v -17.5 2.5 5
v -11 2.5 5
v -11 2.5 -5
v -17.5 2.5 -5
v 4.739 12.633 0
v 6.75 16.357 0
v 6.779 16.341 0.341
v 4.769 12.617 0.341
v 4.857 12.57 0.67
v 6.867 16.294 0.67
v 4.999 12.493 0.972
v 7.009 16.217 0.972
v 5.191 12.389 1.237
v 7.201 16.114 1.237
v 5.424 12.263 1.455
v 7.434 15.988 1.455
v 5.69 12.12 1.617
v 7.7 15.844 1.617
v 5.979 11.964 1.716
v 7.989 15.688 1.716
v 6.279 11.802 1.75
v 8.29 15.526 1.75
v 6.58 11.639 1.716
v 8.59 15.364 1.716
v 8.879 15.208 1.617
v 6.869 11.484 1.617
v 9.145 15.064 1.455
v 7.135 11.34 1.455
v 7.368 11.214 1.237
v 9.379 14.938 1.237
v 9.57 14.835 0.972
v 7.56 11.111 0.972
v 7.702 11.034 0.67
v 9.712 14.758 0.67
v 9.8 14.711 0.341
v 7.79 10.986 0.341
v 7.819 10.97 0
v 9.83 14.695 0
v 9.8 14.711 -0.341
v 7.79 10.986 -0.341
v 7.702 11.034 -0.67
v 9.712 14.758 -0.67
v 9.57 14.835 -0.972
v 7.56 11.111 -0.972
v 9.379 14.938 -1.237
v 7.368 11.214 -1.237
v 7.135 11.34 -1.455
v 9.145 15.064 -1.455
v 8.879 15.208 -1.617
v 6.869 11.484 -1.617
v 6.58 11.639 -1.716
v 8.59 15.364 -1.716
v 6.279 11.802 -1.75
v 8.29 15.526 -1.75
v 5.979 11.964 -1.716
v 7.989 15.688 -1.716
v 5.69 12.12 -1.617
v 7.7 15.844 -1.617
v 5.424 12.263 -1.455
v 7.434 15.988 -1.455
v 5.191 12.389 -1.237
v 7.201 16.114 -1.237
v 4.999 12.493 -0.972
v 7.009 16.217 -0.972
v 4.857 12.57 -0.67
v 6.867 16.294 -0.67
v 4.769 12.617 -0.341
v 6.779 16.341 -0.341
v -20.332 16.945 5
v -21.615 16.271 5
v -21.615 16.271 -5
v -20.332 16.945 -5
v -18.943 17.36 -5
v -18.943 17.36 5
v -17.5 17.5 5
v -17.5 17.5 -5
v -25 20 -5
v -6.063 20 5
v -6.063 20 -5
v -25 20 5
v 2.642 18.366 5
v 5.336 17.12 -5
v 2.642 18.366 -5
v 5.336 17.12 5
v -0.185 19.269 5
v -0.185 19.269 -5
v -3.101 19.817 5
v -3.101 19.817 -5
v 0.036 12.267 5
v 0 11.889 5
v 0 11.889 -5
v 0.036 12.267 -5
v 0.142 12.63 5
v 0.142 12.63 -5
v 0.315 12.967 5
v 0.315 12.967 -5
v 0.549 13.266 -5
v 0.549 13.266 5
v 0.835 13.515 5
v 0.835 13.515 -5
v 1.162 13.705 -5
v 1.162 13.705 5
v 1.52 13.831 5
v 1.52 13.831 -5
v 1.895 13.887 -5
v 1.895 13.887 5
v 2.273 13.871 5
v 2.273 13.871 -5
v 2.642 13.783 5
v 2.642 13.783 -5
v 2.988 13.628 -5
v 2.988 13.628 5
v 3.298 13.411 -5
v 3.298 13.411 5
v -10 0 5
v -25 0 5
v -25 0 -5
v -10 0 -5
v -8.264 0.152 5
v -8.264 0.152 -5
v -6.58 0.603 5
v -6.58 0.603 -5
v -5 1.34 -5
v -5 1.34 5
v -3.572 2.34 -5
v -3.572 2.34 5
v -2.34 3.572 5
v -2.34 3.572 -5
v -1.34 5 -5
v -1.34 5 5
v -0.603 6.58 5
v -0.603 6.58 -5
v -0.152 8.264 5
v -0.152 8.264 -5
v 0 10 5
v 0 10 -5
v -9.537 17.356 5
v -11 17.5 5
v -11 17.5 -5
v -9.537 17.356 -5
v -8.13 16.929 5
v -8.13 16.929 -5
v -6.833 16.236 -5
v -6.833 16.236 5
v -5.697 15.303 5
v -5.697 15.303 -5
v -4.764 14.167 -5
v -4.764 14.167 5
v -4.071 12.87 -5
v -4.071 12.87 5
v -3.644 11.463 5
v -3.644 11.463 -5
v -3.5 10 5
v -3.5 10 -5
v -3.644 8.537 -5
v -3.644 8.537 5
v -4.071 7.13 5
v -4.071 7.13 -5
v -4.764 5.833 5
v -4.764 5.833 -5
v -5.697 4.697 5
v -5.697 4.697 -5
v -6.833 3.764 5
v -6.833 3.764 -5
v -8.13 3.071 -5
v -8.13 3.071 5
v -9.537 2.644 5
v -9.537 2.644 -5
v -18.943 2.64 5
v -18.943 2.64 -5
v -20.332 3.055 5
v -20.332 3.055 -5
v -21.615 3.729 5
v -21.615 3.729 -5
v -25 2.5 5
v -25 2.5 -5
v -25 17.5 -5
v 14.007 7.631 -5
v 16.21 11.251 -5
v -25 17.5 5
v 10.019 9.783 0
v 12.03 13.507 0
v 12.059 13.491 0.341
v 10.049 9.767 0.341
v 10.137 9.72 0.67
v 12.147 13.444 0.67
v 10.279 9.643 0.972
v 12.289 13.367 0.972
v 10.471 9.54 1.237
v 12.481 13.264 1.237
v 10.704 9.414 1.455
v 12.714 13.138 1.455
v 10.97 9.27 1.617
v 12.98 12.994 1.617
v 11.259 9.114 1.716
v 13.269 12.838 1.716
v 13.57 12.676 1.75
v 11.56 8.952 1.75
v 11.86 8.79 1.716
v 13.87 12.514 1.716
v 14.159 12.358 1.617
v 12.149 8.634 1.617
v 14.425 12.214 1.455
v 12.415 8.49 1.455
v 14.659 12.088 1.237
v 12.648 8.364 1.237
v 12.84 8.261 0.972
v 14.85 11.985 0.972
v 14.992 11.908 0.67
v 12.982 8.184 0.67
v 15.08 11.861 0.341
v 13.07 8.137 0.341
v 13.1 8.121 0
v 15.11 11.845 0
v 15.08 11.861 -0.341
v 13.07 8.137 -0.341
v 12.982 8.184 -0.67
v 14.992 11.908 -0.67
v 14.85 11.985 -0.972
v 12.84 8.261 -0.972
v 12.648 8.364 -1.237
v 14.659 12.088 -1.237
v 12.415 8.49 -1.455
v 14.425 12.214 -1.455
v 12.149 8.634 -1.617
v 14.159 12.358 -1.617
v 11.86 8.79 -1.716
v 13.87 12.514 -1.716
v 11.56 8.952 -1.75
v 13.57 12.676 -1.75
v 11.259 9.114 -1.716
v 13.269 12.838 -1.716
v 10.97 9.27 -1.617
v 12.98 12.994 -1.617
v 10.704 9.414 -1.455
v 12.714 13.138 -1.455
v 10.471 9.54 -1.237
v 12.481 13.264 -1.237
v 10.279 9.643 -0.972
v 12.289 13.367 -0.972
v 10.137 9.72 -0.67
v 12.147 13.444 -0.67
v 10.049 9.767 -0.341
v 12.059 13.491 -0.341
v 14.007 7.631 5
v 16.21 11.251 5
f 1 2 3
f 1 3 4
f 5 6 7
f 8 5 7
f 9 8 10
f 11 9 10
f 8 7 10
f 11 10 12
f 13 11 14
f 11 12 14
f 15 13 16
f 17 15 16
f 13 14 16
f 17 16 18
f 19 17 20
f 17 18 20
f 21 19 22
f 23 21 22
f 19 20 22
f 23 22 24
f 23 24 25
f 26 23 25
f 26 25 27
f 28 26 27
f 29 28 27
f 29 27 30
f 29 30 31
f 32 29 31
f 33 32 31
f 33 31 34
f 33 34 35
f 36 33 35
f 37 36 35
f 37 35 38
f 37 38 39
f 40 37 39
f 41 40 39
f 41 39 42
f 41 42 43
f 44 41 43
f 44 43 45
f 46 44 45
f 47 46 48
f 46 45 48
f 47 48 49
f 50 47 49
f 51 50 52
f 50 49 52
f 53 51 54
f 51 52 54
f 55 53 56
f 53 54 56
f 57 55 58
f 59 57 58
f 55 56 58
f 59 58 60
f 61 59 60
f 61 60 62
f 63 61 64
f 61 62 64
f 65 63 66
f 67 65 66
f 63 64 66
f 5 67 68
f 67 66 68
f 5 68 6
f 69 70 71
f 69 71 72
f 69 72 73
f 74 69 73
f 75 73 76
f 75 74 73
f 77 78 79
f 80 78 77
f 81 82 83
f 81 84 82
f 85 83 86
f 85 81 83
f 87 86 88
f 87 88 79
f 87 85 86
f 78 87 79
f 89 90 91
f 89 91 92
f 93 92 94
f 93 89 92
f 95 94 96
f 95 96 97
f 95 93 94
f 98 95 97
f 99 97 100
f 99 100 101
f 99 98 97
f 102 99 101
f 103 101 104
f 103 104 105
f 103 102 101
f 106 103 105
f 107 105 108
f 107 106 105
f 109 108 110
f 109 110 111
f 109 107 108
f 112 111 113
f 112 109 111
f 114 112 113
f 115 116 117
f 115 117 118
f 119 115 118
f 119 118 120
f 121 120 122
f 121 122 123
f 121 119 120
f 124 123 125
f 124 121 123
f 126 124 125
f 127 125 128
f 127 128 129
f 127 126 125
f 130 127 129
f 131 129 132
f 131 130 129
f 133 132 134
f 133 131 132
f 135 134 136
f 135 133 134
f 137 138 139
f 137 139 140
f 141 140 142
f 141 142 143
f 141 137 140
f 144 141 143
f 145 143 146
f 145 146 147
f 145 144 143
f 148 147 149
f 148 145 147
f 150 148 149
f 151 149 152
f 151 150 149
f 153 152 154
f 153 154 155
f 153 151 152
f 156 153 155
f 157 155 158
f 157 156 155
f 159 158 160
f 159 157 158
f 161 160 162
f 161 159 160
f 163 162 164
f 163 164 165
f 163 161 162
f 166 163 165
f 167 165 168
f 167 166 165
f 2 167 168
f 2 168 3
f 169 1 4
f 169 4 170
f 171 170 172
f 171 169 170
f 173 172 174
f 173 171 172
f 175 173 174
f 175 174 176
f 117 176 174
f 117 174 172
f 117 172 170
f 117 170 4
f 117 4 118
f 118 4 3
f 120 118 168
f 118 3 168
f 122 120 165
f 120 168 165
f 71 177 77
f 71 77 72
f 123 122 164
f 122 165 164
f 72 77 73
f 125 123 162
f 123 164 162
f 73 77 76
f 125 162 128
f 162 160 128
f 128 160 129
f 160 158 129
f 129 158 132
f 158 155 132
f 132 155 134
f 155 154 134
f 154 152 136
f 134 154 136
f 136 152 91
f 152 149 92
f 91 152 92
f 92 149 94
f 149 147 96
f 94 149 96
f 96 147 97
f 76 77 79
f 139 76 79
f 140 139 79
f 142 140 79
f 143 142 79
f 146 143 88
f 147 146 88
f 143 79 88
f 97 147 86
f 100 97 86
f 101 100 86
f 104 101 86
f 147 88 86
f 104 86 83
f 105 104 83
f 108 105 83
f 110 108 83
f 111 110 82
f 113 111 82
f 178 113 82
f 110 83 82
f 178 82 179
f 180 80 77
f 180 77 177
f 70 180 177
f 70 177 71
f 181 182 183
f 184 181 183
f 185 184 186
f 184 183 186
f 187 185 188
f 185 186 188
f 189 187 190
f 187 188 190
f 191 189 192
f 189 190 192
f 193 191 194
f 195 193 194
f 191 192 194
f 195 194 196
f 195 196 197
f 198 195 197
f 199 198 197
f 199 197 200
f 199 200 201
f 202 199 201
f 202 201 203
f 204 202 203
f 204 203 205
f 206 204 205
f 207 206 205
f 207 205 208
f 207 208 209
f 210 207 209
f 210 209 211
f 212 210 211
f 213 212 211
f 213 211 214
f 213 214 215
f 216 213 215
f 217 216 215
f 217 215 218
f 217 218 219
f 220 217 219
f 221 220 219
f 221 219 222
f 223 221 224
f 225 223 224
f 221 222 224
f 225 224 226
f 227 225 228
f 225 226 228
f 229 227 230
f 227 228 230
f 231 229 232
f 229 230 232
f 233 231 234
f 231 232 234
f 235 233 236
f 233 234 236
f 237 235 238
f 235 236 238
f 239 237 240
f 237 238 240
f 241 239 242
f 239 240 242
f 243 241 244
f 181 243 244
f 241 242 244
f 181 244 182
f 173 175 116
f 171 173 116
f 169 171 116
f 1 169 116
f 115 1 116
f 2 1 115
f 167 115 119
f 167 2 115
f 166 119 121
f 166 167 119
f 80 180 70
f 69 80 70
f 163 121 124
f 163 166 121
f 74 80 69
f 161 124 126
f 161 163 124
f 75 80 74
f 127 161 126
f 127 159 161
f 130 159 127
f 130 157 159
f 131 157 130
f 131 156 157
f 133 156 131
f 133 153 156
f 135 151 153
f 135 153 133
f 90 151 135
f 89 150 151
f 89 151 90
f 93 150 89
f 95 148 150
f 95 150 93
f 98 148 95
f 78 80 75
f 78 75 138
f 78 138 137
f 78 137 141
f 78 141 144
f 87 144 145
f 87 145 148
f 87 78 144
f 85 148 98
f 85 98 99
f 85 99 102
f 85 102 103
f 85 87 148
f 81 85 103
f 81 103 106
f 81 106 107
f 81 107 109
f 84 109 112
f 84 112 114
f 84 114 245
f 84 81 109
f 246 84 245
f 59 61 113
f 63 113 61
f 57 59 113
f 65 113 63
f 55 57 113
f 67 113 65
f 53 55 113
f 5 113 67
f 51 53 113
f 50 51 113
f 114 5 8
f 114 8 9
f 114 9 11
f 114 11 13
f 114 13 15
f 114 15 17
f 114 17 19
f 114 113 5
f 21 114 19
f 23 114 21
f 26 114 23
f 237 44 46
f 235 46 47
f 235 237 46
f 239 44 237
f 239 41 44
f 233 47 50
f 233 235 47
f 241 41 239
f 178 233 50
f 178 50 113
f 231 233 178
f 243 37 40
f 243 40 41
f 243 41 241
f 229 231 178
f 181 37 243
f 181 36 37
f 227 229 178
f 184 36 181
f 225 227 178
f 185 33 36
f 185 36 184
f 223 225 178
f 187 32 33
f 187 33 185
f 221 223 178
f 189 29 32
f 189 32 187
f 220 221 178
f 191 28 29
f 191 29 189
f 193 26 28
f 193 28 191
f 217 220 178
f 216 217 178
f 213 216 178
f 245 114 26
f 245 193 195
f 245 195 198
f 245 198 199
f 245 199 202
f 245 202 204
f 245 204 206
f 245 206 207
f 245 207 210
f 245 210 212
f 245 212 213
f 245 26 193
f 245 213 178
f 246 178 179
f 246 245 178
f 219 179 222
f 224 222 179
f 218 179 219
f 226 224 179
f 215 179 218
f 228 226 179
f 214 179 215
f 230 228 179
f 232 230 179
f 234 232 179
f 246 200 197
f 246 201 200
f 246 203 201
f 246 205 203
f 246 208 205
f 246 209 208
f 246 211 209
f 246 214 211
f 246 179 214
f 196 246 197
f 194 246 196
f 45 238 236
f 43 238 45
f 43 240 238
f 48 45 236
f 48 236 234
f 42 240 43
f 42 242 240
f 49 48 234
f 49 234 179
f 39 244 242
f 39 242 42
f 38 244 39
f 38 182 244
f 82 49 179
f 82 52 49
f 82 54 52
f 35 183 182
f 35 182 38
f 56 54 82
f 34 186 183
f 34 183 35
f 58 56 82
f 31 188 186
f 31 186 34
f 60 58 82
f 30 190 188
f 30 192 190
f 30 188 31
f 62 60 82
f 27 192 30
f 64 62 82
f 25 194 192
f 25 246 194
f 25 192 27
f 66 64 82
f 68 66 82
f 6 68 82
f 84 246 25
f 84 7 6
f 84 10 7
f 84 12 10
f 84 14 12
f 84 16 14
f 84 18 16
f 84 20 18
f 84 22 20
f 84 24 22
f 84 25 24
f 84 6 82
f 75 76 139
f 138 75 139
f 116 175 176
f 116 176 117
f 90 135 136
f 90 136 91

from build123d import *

# Parameters (mm, degrees)
F1_DEPTH = 5
F2_R     = 1.75
F3_DEPTH = 9.9
F4_R     = 24


# Not quite as in the source:
# - a feature names something its author has since deleted; it is built from what else it names


with BuildPart() as f1:
    # F0 (on Top) → F1 (new body, symmetric)
    with BuildSketch(Plane.XY):
        with BuildLine():
            Line((16.2096246684, 11.2512872423), (0, 20))
            Line((0, 20), (-25, 20))
            Line((-25, 20), (-25, 17.5))
            Line((-25, 17.5), (-17.5, 17.5))
            Line((-17.5, 17.5), (-11, 17.5))
            Line((-11, 17.5), (-3.5, 17.5))
            Line((-3.5, 17.5), (-3.5, 10))
            Line((-3.5, 10), (-3.5, 2.5))
            Line((-3.5, 2.5), (-11, 2.5))
            Line((-11, 2.5), (-17.5, 2.5))
            Line((-17.5, 2.5), (-25, 2.5))
            Line((-25, 2.5), (-25, 0))
            Line((-25, 0), (-10, 0))
            ThreePointArc((-10, 0), (-2.9289321881, 2.9289321881), (0, 10))
            Line((0, 10), (0, 11.8892861952))
            ThreePointArc((0, 11.8892861952), (1.1623016269, 13.7053978206), (3.2982614357, 13.4106399491))
            Line((3.2982614357, 13.4106399491), (14.0066361954, 7.6310801635))
            Line((14.0066361954, 7.6310801635), (16.2096246684, 11.2512872423))
        make_face()
        with BuildLine():
            Line((-17.5, 17.5), (-25, 17.5))
            Line((-25, 17.5), (-21.614659653, 16.270532349))
            ThreePointArc((-21.614659653, 16.270532349), (-19.6472083483, 17.186062643), (-17.5, 17.5))
        make_face()
        with BuildLine():
            Line((-21.614659653, 3.729467651), (-25, 2.5))
            Line((-25, 2.5), (-17.5, 2.5))
            ThreePointArc((-17.5, 2.5), (-19.6472083483, 2.813937357), (-21.614659653, 3.729467651))
        make_face()
        with BuildLine():
            Line((-3.5, 17.5), (-11, 17.5))
            ThreePointArc((-11, 17.5), (-5.6966991411, 15.3033008589), (-3.5, 10))
            Line((-3.5, 10), (-3.5, 17.5))
        make_face()
        with BuildLine():
            Line((-3.5, 2.5), (-3.5, 10))
            ThreePointArc((-3.5, 10), (-5.6966991411, 4.6966991411), (-11, 2.5))
            Line((-11, 2.5), (-3.5, 2.5))
        make_face()
    extrude(amount=F1_DEPTH, both=True)

    # F2 (on face) → F3 (cut)
    with BuildSketch(Plane(origin=(8.3593712251, 15.4882522465, 0), x_dir=(-0.8800071661, 0.4749604064, 0), z_dir=(0.4749604064, 0.8800071661, 0))):
        with Locations((-5.9206699059, 0)):
            Circle(F2_R)
        with Locations((0.0793300941, 0)):
            Circle(F2_R)
    extrude(amount=-F3_DEPTH, mode=Mode.SUBTRACT)

    # F4
    f4_edges = [f1.edges().sort_by_distance(p)[0] for p in [
        (0, 20, 0),
    ]]
    fillet(f4_edges, radius=F4_R)


solid = f1.part
